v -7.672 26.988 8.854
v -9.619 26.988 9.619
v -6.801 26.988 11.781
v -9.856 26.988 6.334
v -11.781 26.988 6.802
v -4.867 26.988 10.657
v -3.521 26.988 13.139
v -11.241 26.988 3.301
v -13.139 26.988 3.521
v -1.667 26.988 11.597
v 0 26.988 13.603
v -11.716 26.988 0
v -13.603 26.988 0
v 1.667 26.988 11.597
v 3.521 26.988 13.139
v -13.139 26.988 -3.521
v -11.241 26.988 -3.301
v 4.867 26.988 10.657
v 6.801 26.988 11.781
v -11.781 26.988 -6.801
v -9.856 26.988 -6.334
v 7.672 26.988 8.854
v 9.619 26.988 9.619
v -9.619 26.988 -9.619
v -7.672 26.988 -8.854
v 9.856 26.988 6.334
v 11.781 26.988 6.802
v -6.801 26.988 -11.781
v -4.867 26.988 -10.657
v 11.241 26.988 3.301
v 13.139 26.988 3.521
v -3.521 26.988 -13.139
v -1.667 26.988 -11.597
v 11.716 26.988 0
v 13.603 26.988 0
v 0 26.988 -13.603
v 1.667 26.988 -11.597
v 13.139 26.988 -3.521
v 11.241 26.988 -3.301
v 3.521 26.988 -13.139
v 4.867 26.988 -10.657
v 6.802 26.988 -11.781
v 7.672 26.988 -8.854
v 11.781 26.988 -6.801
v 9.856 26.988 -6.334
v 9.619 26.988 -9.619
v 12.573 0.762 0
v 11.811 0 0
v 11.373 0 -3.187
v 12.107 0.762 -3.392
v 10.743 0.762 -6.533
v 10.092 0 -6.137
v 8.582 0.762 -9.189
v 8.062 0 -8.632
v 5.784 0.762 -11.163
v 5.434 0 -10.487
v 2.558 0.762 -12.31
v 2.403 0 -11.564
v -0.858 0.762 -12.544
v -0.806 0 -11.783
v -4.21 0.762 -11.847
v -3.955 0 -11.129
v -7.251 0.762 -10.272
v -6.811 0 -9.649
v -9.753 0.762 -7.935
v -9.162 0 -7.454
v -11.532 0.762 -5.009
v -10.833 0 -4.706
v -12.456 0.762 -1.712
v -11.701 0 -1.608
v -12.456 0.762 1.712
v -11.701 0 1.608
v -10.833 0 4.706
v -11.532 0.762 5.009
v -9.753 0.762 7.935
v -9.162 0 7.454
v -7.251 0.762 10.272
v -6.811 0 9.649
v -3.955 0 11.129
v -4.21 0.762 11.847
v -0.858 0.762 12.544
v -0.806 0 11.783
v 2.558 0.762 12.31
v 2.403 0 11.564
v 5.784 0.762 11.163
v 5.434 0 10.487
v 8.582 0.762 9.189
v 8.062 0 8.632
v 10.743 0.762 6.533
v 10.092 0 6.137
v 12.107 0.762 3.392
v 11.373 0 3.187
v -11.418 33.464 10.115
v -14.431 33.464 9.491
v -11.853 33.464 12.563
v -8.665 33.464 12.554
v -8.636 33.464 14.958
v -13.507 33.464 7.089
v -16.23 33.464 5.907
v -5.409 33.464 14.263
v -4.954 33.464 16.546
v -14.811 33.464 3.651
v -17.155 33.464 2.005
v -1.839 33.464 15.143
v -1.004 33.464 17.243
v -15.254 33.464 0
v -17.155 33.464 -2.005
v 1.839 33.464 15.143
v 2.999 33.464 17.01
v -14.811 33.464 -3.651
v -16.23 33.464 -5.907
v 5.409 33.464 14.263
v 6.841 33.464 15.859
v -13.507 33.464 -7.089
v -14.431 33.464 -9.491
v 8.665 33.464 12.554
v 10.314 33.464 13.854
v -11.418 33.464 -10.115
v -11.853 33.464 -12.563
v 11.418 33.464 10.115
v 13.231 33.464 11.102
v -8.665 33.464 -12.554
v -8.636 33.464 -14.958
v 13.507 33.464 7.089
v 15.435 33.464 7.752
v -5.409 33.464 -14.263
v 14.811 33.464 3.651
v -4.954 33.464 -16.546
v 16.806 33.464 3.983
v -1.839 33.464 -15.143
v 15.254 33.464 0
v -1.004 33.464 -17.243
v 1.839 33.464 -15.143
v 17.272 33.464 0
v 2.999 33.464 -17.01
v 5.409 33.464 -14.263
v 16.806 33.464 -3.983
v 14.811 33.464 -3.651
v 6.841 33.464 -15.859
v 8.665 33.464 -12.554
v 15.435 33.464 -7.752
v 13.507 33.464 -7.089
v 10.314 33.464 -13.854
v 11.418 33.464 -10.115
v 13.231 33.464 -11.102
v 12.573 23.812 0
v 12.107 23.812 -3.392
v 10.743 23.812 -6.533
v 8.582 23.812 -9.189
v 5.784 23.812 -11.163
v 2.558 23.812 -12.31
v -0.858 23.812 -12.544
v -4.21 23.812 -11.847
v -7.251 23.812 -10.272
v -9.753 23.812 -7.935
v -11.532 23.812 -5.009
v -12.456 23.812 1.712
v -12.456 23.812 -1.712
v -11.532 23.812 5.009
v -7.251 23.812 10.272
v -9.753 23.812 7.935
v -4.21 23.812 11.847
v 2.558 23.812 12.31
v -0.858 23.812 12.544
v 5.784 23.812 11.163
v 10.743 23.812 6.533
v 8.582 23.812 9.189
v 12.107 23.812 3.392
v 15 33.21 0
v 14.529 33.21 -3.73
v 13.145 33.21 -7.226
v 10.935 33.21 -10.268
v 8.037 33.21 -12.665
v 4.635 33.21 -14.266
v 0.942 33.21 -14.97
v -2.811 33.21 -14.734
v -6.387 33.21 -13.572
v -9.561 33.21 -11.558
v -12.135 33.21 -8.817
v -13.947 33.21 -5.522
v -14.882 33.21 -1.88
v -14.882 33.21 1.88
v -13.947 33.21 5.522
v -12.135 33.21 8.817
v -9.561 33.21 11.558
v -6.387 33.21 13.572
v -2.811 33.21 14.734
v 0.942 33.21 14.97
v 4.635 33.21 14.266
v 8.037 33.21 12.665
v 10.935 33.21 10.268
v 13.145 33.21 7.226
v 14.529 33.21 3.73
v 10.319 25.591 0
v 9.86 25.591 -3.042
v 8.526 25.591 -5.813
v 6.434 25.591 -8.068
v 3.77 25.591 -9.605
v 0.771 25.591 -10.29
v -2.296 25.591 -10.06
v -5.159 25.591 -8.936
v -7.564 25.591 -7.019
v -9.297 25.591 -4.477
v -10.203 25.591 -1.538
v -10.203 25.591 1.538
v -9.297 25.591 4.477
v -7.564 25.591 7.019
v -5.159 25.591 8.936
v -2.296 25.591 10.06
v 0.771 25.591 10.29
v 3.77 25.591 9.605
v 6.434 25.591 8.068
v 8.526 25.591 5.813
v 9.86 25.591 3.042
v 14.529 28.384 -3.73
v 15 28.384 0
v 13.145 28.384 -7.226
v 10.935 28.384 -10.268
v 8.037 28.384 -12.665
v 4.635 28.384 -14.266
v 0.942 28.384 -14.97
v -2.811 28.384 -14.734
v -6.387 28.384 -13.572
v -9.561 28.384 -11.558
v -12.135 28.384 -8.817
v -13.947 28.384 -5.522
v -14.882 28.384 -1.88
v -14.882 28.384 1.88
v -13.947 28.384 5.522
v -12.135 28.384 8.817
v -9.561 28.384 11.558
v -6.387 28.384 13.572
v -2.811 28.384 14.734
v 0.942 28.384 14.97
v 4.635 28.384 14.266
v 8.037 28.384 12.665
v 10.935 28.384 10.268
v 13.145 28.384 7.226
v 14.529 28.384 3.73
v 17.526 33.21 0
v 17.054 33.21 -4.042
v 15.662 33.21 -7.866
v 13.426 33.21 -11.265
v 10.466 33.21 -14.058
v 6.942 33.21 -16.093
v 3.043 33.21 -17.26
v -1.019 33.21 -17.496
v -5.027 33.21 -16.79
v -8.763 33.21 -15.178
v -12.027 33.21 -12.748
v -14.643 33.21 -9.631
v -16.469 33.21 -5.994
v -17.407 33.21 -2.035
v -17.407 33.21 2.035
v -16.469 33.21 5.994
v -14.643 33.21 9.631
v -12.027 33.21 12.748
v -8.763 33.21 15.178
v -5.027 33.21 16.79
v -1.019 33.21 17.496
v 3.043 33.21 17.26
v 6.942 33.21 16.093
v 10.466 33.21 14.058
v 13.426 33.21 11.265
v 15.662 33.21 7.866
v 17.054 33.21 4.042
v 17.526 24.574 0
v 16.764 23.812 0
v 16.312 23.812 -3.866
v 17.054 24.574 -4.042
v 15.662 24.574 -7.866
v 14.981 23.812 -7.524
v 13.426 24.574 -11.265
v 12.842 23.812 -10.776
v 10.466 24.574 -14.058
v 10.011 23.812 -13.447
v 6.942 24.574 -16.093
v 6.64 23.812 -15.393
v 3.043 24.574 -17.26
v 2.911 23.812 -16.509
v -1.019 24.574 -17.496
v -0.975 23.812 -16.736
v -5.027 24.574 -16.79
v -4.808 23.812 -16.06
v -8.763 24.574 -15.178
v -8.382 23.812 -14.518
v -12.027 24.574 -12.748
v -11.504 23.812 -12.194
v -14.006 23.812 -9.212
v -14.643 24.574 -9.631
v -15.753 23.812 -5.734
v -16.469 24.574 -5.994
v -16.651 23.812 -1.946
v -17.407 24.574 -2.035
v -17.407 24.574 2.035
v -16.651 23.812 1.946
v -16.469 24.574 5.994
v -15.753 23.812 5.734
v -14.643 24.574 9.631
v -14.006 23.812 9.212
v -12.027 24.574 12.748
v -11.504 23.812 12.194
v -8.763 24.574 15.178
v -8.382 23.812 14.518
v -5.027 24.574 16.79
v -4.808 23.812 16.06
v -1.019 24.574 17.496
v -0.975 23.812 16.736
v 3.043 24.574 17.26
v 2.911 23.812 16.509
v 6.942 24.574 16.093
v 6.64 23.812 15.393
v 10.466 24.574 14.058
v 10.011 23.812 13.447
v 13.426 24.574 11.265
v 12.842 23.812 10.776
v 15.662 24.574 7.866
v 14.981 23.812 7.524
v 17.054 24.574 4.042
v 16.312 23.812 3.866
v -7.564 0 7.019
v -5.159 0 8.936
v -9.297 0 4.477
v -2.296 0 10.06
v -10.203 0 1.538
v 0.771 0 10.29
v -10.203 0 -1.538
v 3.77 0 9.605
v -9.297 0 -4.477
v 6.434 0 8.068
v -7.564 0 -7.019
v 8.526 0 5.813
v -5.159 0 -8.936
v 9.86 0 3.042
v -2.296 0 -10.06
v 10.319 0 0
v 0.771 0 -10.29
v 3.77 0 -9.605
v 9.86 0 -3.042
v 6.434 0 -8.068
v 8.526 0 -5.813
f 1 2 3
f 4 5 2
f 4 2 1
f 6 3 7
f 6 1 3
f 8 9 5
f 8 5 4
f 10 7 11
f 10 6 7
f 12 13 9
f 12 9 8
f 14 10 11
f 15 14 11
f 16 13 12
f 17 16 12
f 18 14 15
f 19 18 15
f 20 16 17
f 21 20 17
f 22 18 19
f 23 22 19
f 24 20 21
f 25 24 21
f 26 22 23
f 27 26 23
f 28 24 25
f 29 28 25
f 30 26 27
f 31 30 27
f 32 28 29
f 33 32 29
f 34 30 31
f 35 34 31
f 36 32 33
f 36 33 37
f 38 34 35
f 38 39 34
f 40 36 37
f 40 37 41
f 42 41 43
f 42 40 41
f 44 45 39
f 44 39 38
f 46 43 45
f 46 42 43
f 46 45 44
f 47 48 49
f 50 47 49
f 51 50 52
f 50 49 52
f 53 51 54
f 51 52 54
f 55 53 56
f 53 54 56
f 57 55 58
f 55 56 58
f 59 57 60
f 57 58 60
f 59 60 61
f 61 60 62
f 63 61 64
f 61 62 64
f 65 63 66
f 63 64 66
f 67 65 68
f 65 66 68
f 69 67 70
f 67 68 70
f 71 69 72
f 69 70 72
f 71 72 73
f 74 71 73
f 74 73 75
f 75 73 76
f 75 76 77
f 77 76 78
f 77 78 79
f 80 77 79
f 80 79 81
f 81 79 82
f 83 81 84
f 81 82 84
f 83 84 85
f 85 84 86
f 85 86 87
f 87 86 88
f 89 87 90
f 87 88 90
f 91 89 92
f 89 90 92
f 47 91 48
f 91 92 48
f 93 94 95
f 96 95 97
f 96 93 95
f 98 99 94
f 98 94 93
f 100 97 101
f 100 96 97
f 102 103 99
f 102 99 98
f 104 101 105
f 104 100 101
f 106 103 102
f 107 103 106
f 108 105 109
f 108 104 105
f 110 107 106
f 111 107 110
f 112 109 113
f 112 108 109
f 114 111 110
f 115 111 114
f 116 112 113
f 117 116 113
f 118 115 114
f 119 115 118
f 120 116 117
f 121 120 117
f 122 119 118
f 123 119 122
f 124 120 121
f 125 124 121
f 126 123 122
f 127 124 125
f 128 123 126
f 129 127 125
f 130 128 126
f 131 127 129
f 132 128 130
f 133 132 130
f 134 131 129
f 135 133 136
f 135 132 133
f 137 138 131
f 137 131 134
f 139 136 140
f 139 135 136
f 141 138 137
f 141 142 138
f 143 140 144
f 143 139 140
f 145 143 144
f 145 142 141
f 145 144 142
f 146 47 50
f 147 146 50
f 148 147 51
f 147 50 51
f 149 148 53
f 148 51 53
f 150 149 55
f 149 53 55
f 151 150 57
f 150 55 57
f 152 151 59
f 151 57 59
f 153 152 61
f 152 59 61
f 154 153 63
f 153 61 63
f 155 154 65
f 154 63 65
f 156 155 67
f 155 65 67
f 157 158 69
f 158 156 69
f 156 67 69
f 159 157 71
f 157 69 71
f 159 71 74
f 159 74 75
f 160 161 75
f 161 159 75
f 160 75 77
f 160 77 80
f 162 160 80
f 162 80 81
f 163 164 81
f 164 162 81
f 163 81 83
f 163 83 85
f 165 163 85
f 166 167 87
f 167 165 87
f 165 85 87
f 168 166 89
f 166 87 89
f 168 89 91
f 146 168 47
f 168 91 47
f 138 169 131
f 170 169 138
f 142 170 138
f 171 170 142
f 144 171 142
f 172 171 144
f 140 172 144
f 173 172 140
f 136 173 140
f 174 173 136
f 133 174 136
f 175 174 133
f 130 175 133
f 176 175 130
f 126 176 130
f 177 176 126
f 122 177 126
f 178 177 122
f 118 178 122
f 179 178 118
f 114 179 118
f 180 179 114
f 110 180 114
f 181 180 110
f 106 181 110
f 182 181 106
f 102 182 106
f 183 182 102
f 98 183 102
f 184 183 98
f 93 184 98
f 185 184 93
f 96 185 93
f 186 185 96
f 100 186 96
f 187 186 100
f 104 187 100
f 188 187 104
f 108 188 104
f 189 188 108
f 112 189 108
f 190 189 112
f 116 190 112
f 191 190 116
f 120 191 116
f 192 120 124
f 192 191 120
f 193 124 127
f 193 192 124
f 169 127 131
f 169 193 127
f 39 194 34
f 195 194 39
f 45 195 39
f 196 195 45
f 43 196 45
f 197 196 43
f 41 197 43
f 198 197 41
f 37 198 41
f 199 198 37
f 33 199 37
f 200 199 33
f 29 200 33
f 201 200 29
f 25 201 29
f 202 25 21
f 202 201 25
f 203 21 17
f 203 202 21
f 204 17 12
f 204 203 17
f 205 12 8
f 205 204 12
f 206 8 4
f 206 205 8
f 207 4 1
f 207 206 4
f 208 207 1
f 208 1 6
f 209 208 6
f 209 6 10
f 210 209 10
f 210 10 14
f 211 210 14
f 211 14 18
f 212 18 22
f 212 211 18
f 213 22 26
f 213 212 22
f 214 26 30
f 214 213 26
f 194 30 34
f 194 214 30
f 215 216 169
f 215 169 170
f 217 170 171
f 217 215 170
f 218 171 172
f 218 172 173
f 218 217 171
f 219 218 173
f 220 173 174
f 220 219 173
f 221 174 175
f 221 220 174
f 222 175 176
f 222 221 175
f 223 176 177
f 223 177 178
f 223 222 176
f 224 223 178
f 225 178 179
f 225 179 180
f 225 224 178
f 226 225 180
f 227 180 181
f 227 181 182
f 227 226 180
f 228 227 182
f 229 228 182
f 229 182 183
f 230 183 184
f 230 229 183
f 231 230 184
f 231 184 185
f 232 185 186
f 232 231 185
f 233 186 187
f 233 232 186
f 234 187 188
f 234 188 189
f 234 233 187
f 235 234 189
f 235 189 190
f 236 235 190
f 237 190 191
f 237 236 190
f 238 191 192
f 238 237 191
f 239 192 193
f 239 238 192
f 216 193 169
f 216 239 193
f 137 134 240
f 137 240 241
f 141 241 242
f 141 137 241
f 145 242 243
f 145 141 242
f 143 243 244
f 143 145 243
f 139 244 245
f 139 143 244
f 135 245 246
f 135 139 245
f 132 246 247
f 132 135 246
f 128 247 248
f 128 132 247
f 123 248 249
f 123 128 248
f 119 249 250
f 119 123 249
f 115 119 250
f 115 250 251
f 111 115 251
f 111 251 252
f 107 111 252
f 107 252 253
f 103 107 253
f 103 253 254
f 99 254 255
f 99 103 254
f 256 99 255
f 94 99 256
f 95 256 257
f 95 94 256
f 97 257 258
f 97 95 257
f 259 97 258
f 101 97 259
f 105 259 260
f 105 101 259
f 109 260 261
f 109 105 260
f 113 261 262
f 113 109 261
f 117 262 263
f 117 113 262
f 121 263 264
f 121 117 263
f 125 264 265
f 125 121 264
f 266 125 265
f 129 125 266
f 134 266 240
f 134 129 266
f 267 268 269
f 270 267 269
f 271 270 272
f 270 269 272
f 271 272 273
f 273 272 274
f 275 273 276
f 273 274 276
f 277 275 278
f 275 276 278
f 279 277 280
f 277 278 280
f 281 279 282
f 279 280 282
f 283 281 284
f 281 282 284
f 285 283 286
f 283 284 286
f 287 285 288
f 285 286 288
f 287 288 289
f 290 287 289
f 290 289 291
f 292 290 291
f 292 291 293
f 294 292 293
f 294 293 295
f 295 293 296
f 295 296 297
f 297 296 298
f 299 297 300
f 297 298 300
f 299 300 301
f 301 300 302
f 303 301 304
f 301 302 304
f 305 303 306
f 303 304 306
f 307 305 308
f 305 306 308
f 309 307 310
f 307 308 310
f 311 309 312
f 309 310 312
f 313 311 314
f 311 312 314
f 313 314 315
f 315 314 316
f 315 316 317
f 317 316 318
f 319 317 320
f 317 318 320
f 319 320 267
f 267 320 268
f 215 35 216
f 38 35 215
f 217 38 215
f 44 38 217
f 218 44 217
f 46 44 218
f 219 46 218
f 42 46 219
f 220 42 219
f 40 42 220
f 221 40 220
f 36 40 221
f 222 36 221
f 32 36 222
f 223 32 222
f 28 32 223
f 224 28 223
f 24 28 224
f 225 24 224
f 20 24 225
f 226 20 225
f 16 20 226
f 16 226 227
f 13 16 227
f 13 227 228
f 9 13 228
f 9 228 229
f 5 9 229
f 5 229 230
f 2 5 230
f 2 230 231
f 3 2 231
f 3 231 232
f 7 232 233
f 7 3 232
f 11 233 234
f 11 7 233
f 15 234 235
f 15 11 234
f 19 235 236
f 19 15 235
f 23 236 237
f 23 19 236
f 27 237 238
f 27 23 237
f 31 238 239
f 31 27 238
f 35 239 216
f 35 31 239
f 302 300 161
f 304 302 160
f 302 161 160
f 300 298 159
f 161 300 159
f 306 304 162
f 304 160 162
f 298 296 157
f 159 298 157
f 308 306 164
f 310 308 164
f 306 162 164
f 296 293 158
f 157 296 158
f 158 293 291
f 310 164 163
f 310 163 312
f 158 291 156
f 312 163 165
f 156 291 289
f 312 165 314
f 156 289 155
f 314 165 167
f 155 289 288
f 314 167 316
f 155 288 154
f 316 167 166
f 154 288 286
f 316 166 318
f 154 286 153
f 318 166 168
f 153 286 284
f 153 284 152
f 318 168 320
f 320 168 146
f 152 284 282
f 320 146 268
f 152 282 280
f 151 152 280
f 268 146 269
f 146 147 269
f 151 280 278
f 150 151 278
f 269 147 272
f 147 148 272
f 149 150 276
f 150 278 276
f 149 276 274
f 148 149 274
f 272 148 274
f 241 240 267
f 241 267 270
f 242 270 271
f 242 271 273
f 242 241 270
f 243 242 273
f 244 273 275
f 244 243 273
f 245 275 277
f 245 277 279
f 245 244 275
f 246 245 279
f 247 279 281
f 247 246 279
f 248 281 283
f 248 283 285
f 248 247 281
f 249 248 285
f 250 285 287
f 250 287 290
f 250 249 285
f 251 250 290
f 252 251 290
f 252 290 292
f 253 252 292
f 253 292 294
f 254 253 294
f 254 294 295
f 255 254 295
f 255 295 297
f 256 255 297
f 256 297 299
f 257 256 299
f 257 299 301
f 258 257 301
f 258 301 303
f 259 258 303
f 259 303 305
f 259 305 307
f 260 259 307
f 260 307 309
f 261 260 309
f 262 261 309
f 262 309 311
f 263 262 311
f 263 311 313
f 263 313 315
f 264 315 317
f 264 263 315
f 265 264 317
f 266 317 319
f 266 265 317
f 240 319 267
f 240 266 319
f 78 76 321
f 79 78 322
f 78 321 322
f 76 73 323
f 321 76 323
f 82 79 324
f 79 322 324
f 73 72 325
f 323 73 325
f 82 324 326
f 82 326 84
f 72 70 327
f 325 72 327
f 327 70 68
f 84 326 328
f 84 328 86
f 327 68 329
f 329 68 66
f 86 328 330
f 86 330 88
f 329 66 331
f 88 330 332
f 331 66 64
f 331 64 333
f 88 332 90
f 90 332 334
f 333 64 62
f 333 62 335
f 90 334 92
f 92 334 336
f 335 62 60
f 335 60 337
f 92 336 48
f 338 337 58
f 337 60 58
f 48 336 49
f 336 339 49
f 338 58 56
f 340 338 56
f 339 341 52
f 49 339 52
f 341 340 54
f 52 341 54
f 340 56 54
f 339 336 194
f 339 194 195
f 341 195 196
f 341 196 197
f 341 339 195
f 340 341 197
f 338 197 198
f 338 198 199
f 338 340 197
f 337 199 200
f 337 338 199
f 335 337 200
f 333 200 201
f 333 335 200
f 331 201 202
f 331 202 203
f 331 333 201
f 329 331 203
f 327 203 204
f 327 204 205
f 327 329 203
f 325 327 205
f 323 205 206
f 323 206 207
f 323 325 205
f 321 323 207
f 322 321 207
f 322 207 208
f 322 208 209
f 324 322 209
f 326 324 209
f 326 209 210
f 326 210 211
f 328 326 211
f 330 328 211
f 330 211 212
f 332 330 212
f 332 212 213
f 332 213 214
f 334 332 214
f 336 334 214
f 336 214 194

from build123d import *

# Parameters (mm, degrees)
SKETCH1_R           = 12.573
SKETCH1_R_2         = 10.31875
BOSS_EXTRUDE1_DEPTH = 26.9875
SKETCH2_R           = 17.526
SKETCH2_R_2         = 10.31875
BOSS_EXTRUDE2_DEPTH = 3.175
SKETCH3_R           = 17.526
SKETCH3_R_2         = 15
BOSS_EXTRUDE3_DEPTH = 6.477
CHAMFER1_SIZE       = 0.762
CHAMFER3_SIZE       = 0.254
CHAMFER4_SIZE       = 0.254
CHAMFER5_SIZE       = 1.397
CHAMFER6_SIZE       = 1.397


with BuildPart() as part:
    # Sketch1 → Boss-Extrude1 (new body)
    with BuildSketch(Plane(origin=(0, 0, 0), x_dir=(1, 0, 0), z_dir=(0, 1, 0))):
        Circle(SKETCH1_R)
        Circle(SKETCH1_R_2, mode=Mode.SUBTRACT)
    extrude(amount=BOSS_EXTRUDE1_DEPTH)

    # Sketch2 → Boss-Extrude2 (add)
    with BuildSketch(Plane(origin=(0, 26.9875, 0), x_dir=(1, 0, 0), z_dir=(0, 1, 0))):
        Circle(SKETCH2_R)
        Circle(SKETCH2_R_2, mode=Mode.SUBTRACT)
    extrude(amount=-BOSS_EXTRUDE2_DEPTH)

    # Sketch3 → Boss-Extrude3 (add)
    with BuildSketch(Plane(origin=(0, 26.9875, 0), x_dir=(1, 0, 0), z_dir=(0, 1, 0))):
        Circle(SKETCH3_R)
        Circle(SKETCH3_R_2, mode=Mode.SUBTRACT)
    extrude(amount=BOSS_EXTRUDE3_DEPTH)

    # Chamfer1
    chamfer1_edges = [part.edges().sort_by_distance(p)[0] for p in [
        (-17.526, 23.8125, 0),
        (-12.573, 0, 0),
    ]]
    chamfer(chamfer1_edges, length=CHAMFER1_SIZE)

    # Chamfer3
    chamfer3_edges = [part.edges().sort_by_distance(p)[0] for p in [
        (-17.526, 33.4645, 0),
    ]]
    chamfer(chamfer3_edges, length=CHAMFER3_SIZE)

    # Chamfer4
    chamfer4_edges = [part.edges().sort_by_distance(p)[0] for p in [
        (-15, 33.4645, 0),
    ]]
    chamfer(chamfer4_edges, length=CHAMFER4_SIZE)

    # Chamfer5
    chamfer5_edges = [part.edges().sort_by_distance(p)[0] for p in [
        (-15, 26.9875, 0),
    ]]
    chamfer(chamfer5_edges, length=CHAMFER5_SIZE)

    # Chamfer6
    chamfer6_edges = [part.edges().sort_by_distance(p)[0] for p in [
        (-10.31875, 26.9875, 0),
    ]]
    chamfer(chamfer6_edges, length=CHAMFER6_SIZE)


solid = part.part
